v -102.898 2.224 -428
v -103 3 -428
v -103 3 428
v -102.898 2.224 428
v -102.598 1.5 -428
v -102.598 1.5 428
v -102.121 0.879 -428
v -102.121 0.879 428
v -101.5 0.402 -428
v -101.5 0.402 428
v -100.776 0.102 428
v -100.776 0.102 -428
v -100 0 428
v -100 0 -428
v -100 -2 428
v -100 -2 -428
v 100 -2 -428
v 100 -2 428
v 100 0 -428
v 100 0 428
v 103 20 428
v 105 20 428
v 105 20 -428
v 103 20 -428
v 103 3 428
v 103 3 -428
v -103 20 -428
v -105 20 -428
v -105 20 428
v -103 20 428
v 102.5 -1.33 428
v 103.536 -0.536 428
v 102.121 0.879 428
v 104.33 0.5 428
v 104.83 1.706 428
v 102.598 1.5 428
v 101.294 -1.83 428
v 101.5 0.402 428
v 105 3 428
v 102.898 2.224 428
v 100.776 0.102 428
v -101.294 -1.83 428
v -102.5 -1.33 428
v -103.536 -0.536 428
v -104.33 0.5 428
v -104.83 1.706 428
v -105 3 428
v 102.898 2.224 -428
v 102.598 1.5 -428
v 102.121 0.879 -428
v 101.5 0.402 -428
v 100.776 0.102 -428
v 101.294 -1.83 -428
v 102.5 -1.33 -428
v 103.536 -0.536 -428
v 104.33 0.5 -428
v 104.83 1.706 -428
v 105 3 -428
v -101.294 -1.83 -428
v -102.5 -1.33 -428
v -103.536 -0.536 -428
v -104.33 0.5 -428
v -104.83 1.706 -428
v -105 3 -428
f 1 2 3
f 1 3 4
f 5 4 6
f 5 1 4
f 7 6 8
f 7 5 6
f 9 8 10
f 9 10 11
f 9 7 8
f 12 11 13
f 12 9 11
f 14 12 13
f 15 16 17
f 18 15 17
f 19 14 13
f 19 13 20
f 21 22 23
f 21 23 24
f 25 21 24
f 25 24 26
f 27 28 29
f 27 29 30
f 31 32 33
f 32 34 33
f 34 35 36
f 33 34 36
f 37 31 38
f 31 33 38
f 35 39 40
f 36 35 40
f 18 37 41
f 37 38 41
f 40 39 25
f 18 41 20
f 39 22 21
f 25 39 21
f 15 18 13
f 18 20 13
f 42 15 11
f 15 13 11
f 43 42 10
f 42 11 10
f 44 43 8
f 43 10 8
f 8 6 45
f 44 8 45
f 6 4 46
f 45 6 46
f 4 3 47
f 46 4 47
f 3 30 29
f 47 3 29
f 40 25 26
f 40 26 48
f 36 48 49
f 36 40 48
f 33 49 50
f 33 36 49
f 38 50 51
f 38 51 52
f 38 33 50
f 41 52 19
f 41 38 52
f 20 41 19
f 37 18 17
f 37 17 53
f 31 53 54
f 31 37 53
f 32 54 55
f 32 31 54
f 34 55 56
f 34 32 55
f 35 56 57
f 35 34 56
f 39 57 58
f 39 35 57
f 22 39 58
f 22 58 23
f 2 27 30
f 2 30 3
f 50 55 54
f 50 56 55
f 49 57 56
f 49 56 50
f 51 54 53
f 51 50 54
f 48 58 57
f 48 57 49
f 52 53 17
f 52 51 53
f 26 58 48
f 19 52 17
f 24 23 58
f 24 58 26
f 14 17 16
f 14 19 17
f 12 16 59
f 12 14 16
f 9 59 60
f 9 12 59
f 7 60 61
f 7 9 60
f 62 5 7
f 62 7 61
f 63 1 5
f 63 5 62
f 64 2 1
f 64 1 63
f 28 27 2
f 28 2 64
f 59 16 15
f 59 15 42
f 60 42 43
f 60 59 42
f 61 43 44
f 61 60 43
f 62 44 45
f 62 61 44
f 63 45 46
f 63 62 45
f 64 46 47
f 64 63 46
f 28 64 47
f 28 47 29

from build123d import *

# Parameters (mm, degrees)
SKETCH1_W               = 200
SKETCH1_H               = 856
BASE_FLANGE1_DEPTH      = 2
EDGE_FLANGE1_DEPTH      = 856
EDGE_FLANGE1_BEND_DEPTH = 856


# Sheet-metal steps are written as plain solids
with BuildPart() as part:
    # Sketch1 → Base-Flange1 (new body)
    with BuildSketch(Plane(origin=(0, 0, 0), x_dir=(1, 0, 0), z_dir=(0, 1, 0))):
        Rectangle(SKETCH1_W, SKETCH1_H)
    extrude(amount=-BASE_FLANGE1_DEPTH)

    # Edge-Flange1 section (across the edge) → Edge-Flange1 (add)
    with BuildSketch(Plane(origin=(103, 0, 428), x_dir=(-1, 0, 0), z_dir=(0, 0, -1))):
        with BuildLine():
            Line((-2, 3), (-2, 20))
            Line((-2, 20), (0, 20))
            Line((0, 20), (0, 3))
            ThreePointArc((0, 3), (0.878679656, 0.878679656), (3, 0))
            Line((3, 0), (3, -2))
            ThreePointArc((3, -2), (-0.535533906, -0.535533906), (-2, 3))
        make_face()
    extrude(amount=EDGE_FLANGE1_DEPTH)

    # Edge-Flange1 section 2 (across the edge) → Edge-Flange1 bend (add)
    with BuildSketch(Plane(origin=(-103, 0, -428), x_dir=(1, 0, 0), z_dir=(0, 0, 1))):
        with BuildLine():
            Line((-2, 3), (-2, 20))
            Line((-2, 20), (0, 20))
            Line((0, 20), (0, 3))
            ThreePointArc((0, 3), (0.878679656, 0.878679656), (3, 0))
            Line((3, 0), (3, -2))
            ThreePointArc((3, -2), (-0.535533906, -0.535533906), (-2, 3))
        make_face()
    extrude(amount=EDGE_FLANGE1_BEND_DEPTH)


solid = part.part
